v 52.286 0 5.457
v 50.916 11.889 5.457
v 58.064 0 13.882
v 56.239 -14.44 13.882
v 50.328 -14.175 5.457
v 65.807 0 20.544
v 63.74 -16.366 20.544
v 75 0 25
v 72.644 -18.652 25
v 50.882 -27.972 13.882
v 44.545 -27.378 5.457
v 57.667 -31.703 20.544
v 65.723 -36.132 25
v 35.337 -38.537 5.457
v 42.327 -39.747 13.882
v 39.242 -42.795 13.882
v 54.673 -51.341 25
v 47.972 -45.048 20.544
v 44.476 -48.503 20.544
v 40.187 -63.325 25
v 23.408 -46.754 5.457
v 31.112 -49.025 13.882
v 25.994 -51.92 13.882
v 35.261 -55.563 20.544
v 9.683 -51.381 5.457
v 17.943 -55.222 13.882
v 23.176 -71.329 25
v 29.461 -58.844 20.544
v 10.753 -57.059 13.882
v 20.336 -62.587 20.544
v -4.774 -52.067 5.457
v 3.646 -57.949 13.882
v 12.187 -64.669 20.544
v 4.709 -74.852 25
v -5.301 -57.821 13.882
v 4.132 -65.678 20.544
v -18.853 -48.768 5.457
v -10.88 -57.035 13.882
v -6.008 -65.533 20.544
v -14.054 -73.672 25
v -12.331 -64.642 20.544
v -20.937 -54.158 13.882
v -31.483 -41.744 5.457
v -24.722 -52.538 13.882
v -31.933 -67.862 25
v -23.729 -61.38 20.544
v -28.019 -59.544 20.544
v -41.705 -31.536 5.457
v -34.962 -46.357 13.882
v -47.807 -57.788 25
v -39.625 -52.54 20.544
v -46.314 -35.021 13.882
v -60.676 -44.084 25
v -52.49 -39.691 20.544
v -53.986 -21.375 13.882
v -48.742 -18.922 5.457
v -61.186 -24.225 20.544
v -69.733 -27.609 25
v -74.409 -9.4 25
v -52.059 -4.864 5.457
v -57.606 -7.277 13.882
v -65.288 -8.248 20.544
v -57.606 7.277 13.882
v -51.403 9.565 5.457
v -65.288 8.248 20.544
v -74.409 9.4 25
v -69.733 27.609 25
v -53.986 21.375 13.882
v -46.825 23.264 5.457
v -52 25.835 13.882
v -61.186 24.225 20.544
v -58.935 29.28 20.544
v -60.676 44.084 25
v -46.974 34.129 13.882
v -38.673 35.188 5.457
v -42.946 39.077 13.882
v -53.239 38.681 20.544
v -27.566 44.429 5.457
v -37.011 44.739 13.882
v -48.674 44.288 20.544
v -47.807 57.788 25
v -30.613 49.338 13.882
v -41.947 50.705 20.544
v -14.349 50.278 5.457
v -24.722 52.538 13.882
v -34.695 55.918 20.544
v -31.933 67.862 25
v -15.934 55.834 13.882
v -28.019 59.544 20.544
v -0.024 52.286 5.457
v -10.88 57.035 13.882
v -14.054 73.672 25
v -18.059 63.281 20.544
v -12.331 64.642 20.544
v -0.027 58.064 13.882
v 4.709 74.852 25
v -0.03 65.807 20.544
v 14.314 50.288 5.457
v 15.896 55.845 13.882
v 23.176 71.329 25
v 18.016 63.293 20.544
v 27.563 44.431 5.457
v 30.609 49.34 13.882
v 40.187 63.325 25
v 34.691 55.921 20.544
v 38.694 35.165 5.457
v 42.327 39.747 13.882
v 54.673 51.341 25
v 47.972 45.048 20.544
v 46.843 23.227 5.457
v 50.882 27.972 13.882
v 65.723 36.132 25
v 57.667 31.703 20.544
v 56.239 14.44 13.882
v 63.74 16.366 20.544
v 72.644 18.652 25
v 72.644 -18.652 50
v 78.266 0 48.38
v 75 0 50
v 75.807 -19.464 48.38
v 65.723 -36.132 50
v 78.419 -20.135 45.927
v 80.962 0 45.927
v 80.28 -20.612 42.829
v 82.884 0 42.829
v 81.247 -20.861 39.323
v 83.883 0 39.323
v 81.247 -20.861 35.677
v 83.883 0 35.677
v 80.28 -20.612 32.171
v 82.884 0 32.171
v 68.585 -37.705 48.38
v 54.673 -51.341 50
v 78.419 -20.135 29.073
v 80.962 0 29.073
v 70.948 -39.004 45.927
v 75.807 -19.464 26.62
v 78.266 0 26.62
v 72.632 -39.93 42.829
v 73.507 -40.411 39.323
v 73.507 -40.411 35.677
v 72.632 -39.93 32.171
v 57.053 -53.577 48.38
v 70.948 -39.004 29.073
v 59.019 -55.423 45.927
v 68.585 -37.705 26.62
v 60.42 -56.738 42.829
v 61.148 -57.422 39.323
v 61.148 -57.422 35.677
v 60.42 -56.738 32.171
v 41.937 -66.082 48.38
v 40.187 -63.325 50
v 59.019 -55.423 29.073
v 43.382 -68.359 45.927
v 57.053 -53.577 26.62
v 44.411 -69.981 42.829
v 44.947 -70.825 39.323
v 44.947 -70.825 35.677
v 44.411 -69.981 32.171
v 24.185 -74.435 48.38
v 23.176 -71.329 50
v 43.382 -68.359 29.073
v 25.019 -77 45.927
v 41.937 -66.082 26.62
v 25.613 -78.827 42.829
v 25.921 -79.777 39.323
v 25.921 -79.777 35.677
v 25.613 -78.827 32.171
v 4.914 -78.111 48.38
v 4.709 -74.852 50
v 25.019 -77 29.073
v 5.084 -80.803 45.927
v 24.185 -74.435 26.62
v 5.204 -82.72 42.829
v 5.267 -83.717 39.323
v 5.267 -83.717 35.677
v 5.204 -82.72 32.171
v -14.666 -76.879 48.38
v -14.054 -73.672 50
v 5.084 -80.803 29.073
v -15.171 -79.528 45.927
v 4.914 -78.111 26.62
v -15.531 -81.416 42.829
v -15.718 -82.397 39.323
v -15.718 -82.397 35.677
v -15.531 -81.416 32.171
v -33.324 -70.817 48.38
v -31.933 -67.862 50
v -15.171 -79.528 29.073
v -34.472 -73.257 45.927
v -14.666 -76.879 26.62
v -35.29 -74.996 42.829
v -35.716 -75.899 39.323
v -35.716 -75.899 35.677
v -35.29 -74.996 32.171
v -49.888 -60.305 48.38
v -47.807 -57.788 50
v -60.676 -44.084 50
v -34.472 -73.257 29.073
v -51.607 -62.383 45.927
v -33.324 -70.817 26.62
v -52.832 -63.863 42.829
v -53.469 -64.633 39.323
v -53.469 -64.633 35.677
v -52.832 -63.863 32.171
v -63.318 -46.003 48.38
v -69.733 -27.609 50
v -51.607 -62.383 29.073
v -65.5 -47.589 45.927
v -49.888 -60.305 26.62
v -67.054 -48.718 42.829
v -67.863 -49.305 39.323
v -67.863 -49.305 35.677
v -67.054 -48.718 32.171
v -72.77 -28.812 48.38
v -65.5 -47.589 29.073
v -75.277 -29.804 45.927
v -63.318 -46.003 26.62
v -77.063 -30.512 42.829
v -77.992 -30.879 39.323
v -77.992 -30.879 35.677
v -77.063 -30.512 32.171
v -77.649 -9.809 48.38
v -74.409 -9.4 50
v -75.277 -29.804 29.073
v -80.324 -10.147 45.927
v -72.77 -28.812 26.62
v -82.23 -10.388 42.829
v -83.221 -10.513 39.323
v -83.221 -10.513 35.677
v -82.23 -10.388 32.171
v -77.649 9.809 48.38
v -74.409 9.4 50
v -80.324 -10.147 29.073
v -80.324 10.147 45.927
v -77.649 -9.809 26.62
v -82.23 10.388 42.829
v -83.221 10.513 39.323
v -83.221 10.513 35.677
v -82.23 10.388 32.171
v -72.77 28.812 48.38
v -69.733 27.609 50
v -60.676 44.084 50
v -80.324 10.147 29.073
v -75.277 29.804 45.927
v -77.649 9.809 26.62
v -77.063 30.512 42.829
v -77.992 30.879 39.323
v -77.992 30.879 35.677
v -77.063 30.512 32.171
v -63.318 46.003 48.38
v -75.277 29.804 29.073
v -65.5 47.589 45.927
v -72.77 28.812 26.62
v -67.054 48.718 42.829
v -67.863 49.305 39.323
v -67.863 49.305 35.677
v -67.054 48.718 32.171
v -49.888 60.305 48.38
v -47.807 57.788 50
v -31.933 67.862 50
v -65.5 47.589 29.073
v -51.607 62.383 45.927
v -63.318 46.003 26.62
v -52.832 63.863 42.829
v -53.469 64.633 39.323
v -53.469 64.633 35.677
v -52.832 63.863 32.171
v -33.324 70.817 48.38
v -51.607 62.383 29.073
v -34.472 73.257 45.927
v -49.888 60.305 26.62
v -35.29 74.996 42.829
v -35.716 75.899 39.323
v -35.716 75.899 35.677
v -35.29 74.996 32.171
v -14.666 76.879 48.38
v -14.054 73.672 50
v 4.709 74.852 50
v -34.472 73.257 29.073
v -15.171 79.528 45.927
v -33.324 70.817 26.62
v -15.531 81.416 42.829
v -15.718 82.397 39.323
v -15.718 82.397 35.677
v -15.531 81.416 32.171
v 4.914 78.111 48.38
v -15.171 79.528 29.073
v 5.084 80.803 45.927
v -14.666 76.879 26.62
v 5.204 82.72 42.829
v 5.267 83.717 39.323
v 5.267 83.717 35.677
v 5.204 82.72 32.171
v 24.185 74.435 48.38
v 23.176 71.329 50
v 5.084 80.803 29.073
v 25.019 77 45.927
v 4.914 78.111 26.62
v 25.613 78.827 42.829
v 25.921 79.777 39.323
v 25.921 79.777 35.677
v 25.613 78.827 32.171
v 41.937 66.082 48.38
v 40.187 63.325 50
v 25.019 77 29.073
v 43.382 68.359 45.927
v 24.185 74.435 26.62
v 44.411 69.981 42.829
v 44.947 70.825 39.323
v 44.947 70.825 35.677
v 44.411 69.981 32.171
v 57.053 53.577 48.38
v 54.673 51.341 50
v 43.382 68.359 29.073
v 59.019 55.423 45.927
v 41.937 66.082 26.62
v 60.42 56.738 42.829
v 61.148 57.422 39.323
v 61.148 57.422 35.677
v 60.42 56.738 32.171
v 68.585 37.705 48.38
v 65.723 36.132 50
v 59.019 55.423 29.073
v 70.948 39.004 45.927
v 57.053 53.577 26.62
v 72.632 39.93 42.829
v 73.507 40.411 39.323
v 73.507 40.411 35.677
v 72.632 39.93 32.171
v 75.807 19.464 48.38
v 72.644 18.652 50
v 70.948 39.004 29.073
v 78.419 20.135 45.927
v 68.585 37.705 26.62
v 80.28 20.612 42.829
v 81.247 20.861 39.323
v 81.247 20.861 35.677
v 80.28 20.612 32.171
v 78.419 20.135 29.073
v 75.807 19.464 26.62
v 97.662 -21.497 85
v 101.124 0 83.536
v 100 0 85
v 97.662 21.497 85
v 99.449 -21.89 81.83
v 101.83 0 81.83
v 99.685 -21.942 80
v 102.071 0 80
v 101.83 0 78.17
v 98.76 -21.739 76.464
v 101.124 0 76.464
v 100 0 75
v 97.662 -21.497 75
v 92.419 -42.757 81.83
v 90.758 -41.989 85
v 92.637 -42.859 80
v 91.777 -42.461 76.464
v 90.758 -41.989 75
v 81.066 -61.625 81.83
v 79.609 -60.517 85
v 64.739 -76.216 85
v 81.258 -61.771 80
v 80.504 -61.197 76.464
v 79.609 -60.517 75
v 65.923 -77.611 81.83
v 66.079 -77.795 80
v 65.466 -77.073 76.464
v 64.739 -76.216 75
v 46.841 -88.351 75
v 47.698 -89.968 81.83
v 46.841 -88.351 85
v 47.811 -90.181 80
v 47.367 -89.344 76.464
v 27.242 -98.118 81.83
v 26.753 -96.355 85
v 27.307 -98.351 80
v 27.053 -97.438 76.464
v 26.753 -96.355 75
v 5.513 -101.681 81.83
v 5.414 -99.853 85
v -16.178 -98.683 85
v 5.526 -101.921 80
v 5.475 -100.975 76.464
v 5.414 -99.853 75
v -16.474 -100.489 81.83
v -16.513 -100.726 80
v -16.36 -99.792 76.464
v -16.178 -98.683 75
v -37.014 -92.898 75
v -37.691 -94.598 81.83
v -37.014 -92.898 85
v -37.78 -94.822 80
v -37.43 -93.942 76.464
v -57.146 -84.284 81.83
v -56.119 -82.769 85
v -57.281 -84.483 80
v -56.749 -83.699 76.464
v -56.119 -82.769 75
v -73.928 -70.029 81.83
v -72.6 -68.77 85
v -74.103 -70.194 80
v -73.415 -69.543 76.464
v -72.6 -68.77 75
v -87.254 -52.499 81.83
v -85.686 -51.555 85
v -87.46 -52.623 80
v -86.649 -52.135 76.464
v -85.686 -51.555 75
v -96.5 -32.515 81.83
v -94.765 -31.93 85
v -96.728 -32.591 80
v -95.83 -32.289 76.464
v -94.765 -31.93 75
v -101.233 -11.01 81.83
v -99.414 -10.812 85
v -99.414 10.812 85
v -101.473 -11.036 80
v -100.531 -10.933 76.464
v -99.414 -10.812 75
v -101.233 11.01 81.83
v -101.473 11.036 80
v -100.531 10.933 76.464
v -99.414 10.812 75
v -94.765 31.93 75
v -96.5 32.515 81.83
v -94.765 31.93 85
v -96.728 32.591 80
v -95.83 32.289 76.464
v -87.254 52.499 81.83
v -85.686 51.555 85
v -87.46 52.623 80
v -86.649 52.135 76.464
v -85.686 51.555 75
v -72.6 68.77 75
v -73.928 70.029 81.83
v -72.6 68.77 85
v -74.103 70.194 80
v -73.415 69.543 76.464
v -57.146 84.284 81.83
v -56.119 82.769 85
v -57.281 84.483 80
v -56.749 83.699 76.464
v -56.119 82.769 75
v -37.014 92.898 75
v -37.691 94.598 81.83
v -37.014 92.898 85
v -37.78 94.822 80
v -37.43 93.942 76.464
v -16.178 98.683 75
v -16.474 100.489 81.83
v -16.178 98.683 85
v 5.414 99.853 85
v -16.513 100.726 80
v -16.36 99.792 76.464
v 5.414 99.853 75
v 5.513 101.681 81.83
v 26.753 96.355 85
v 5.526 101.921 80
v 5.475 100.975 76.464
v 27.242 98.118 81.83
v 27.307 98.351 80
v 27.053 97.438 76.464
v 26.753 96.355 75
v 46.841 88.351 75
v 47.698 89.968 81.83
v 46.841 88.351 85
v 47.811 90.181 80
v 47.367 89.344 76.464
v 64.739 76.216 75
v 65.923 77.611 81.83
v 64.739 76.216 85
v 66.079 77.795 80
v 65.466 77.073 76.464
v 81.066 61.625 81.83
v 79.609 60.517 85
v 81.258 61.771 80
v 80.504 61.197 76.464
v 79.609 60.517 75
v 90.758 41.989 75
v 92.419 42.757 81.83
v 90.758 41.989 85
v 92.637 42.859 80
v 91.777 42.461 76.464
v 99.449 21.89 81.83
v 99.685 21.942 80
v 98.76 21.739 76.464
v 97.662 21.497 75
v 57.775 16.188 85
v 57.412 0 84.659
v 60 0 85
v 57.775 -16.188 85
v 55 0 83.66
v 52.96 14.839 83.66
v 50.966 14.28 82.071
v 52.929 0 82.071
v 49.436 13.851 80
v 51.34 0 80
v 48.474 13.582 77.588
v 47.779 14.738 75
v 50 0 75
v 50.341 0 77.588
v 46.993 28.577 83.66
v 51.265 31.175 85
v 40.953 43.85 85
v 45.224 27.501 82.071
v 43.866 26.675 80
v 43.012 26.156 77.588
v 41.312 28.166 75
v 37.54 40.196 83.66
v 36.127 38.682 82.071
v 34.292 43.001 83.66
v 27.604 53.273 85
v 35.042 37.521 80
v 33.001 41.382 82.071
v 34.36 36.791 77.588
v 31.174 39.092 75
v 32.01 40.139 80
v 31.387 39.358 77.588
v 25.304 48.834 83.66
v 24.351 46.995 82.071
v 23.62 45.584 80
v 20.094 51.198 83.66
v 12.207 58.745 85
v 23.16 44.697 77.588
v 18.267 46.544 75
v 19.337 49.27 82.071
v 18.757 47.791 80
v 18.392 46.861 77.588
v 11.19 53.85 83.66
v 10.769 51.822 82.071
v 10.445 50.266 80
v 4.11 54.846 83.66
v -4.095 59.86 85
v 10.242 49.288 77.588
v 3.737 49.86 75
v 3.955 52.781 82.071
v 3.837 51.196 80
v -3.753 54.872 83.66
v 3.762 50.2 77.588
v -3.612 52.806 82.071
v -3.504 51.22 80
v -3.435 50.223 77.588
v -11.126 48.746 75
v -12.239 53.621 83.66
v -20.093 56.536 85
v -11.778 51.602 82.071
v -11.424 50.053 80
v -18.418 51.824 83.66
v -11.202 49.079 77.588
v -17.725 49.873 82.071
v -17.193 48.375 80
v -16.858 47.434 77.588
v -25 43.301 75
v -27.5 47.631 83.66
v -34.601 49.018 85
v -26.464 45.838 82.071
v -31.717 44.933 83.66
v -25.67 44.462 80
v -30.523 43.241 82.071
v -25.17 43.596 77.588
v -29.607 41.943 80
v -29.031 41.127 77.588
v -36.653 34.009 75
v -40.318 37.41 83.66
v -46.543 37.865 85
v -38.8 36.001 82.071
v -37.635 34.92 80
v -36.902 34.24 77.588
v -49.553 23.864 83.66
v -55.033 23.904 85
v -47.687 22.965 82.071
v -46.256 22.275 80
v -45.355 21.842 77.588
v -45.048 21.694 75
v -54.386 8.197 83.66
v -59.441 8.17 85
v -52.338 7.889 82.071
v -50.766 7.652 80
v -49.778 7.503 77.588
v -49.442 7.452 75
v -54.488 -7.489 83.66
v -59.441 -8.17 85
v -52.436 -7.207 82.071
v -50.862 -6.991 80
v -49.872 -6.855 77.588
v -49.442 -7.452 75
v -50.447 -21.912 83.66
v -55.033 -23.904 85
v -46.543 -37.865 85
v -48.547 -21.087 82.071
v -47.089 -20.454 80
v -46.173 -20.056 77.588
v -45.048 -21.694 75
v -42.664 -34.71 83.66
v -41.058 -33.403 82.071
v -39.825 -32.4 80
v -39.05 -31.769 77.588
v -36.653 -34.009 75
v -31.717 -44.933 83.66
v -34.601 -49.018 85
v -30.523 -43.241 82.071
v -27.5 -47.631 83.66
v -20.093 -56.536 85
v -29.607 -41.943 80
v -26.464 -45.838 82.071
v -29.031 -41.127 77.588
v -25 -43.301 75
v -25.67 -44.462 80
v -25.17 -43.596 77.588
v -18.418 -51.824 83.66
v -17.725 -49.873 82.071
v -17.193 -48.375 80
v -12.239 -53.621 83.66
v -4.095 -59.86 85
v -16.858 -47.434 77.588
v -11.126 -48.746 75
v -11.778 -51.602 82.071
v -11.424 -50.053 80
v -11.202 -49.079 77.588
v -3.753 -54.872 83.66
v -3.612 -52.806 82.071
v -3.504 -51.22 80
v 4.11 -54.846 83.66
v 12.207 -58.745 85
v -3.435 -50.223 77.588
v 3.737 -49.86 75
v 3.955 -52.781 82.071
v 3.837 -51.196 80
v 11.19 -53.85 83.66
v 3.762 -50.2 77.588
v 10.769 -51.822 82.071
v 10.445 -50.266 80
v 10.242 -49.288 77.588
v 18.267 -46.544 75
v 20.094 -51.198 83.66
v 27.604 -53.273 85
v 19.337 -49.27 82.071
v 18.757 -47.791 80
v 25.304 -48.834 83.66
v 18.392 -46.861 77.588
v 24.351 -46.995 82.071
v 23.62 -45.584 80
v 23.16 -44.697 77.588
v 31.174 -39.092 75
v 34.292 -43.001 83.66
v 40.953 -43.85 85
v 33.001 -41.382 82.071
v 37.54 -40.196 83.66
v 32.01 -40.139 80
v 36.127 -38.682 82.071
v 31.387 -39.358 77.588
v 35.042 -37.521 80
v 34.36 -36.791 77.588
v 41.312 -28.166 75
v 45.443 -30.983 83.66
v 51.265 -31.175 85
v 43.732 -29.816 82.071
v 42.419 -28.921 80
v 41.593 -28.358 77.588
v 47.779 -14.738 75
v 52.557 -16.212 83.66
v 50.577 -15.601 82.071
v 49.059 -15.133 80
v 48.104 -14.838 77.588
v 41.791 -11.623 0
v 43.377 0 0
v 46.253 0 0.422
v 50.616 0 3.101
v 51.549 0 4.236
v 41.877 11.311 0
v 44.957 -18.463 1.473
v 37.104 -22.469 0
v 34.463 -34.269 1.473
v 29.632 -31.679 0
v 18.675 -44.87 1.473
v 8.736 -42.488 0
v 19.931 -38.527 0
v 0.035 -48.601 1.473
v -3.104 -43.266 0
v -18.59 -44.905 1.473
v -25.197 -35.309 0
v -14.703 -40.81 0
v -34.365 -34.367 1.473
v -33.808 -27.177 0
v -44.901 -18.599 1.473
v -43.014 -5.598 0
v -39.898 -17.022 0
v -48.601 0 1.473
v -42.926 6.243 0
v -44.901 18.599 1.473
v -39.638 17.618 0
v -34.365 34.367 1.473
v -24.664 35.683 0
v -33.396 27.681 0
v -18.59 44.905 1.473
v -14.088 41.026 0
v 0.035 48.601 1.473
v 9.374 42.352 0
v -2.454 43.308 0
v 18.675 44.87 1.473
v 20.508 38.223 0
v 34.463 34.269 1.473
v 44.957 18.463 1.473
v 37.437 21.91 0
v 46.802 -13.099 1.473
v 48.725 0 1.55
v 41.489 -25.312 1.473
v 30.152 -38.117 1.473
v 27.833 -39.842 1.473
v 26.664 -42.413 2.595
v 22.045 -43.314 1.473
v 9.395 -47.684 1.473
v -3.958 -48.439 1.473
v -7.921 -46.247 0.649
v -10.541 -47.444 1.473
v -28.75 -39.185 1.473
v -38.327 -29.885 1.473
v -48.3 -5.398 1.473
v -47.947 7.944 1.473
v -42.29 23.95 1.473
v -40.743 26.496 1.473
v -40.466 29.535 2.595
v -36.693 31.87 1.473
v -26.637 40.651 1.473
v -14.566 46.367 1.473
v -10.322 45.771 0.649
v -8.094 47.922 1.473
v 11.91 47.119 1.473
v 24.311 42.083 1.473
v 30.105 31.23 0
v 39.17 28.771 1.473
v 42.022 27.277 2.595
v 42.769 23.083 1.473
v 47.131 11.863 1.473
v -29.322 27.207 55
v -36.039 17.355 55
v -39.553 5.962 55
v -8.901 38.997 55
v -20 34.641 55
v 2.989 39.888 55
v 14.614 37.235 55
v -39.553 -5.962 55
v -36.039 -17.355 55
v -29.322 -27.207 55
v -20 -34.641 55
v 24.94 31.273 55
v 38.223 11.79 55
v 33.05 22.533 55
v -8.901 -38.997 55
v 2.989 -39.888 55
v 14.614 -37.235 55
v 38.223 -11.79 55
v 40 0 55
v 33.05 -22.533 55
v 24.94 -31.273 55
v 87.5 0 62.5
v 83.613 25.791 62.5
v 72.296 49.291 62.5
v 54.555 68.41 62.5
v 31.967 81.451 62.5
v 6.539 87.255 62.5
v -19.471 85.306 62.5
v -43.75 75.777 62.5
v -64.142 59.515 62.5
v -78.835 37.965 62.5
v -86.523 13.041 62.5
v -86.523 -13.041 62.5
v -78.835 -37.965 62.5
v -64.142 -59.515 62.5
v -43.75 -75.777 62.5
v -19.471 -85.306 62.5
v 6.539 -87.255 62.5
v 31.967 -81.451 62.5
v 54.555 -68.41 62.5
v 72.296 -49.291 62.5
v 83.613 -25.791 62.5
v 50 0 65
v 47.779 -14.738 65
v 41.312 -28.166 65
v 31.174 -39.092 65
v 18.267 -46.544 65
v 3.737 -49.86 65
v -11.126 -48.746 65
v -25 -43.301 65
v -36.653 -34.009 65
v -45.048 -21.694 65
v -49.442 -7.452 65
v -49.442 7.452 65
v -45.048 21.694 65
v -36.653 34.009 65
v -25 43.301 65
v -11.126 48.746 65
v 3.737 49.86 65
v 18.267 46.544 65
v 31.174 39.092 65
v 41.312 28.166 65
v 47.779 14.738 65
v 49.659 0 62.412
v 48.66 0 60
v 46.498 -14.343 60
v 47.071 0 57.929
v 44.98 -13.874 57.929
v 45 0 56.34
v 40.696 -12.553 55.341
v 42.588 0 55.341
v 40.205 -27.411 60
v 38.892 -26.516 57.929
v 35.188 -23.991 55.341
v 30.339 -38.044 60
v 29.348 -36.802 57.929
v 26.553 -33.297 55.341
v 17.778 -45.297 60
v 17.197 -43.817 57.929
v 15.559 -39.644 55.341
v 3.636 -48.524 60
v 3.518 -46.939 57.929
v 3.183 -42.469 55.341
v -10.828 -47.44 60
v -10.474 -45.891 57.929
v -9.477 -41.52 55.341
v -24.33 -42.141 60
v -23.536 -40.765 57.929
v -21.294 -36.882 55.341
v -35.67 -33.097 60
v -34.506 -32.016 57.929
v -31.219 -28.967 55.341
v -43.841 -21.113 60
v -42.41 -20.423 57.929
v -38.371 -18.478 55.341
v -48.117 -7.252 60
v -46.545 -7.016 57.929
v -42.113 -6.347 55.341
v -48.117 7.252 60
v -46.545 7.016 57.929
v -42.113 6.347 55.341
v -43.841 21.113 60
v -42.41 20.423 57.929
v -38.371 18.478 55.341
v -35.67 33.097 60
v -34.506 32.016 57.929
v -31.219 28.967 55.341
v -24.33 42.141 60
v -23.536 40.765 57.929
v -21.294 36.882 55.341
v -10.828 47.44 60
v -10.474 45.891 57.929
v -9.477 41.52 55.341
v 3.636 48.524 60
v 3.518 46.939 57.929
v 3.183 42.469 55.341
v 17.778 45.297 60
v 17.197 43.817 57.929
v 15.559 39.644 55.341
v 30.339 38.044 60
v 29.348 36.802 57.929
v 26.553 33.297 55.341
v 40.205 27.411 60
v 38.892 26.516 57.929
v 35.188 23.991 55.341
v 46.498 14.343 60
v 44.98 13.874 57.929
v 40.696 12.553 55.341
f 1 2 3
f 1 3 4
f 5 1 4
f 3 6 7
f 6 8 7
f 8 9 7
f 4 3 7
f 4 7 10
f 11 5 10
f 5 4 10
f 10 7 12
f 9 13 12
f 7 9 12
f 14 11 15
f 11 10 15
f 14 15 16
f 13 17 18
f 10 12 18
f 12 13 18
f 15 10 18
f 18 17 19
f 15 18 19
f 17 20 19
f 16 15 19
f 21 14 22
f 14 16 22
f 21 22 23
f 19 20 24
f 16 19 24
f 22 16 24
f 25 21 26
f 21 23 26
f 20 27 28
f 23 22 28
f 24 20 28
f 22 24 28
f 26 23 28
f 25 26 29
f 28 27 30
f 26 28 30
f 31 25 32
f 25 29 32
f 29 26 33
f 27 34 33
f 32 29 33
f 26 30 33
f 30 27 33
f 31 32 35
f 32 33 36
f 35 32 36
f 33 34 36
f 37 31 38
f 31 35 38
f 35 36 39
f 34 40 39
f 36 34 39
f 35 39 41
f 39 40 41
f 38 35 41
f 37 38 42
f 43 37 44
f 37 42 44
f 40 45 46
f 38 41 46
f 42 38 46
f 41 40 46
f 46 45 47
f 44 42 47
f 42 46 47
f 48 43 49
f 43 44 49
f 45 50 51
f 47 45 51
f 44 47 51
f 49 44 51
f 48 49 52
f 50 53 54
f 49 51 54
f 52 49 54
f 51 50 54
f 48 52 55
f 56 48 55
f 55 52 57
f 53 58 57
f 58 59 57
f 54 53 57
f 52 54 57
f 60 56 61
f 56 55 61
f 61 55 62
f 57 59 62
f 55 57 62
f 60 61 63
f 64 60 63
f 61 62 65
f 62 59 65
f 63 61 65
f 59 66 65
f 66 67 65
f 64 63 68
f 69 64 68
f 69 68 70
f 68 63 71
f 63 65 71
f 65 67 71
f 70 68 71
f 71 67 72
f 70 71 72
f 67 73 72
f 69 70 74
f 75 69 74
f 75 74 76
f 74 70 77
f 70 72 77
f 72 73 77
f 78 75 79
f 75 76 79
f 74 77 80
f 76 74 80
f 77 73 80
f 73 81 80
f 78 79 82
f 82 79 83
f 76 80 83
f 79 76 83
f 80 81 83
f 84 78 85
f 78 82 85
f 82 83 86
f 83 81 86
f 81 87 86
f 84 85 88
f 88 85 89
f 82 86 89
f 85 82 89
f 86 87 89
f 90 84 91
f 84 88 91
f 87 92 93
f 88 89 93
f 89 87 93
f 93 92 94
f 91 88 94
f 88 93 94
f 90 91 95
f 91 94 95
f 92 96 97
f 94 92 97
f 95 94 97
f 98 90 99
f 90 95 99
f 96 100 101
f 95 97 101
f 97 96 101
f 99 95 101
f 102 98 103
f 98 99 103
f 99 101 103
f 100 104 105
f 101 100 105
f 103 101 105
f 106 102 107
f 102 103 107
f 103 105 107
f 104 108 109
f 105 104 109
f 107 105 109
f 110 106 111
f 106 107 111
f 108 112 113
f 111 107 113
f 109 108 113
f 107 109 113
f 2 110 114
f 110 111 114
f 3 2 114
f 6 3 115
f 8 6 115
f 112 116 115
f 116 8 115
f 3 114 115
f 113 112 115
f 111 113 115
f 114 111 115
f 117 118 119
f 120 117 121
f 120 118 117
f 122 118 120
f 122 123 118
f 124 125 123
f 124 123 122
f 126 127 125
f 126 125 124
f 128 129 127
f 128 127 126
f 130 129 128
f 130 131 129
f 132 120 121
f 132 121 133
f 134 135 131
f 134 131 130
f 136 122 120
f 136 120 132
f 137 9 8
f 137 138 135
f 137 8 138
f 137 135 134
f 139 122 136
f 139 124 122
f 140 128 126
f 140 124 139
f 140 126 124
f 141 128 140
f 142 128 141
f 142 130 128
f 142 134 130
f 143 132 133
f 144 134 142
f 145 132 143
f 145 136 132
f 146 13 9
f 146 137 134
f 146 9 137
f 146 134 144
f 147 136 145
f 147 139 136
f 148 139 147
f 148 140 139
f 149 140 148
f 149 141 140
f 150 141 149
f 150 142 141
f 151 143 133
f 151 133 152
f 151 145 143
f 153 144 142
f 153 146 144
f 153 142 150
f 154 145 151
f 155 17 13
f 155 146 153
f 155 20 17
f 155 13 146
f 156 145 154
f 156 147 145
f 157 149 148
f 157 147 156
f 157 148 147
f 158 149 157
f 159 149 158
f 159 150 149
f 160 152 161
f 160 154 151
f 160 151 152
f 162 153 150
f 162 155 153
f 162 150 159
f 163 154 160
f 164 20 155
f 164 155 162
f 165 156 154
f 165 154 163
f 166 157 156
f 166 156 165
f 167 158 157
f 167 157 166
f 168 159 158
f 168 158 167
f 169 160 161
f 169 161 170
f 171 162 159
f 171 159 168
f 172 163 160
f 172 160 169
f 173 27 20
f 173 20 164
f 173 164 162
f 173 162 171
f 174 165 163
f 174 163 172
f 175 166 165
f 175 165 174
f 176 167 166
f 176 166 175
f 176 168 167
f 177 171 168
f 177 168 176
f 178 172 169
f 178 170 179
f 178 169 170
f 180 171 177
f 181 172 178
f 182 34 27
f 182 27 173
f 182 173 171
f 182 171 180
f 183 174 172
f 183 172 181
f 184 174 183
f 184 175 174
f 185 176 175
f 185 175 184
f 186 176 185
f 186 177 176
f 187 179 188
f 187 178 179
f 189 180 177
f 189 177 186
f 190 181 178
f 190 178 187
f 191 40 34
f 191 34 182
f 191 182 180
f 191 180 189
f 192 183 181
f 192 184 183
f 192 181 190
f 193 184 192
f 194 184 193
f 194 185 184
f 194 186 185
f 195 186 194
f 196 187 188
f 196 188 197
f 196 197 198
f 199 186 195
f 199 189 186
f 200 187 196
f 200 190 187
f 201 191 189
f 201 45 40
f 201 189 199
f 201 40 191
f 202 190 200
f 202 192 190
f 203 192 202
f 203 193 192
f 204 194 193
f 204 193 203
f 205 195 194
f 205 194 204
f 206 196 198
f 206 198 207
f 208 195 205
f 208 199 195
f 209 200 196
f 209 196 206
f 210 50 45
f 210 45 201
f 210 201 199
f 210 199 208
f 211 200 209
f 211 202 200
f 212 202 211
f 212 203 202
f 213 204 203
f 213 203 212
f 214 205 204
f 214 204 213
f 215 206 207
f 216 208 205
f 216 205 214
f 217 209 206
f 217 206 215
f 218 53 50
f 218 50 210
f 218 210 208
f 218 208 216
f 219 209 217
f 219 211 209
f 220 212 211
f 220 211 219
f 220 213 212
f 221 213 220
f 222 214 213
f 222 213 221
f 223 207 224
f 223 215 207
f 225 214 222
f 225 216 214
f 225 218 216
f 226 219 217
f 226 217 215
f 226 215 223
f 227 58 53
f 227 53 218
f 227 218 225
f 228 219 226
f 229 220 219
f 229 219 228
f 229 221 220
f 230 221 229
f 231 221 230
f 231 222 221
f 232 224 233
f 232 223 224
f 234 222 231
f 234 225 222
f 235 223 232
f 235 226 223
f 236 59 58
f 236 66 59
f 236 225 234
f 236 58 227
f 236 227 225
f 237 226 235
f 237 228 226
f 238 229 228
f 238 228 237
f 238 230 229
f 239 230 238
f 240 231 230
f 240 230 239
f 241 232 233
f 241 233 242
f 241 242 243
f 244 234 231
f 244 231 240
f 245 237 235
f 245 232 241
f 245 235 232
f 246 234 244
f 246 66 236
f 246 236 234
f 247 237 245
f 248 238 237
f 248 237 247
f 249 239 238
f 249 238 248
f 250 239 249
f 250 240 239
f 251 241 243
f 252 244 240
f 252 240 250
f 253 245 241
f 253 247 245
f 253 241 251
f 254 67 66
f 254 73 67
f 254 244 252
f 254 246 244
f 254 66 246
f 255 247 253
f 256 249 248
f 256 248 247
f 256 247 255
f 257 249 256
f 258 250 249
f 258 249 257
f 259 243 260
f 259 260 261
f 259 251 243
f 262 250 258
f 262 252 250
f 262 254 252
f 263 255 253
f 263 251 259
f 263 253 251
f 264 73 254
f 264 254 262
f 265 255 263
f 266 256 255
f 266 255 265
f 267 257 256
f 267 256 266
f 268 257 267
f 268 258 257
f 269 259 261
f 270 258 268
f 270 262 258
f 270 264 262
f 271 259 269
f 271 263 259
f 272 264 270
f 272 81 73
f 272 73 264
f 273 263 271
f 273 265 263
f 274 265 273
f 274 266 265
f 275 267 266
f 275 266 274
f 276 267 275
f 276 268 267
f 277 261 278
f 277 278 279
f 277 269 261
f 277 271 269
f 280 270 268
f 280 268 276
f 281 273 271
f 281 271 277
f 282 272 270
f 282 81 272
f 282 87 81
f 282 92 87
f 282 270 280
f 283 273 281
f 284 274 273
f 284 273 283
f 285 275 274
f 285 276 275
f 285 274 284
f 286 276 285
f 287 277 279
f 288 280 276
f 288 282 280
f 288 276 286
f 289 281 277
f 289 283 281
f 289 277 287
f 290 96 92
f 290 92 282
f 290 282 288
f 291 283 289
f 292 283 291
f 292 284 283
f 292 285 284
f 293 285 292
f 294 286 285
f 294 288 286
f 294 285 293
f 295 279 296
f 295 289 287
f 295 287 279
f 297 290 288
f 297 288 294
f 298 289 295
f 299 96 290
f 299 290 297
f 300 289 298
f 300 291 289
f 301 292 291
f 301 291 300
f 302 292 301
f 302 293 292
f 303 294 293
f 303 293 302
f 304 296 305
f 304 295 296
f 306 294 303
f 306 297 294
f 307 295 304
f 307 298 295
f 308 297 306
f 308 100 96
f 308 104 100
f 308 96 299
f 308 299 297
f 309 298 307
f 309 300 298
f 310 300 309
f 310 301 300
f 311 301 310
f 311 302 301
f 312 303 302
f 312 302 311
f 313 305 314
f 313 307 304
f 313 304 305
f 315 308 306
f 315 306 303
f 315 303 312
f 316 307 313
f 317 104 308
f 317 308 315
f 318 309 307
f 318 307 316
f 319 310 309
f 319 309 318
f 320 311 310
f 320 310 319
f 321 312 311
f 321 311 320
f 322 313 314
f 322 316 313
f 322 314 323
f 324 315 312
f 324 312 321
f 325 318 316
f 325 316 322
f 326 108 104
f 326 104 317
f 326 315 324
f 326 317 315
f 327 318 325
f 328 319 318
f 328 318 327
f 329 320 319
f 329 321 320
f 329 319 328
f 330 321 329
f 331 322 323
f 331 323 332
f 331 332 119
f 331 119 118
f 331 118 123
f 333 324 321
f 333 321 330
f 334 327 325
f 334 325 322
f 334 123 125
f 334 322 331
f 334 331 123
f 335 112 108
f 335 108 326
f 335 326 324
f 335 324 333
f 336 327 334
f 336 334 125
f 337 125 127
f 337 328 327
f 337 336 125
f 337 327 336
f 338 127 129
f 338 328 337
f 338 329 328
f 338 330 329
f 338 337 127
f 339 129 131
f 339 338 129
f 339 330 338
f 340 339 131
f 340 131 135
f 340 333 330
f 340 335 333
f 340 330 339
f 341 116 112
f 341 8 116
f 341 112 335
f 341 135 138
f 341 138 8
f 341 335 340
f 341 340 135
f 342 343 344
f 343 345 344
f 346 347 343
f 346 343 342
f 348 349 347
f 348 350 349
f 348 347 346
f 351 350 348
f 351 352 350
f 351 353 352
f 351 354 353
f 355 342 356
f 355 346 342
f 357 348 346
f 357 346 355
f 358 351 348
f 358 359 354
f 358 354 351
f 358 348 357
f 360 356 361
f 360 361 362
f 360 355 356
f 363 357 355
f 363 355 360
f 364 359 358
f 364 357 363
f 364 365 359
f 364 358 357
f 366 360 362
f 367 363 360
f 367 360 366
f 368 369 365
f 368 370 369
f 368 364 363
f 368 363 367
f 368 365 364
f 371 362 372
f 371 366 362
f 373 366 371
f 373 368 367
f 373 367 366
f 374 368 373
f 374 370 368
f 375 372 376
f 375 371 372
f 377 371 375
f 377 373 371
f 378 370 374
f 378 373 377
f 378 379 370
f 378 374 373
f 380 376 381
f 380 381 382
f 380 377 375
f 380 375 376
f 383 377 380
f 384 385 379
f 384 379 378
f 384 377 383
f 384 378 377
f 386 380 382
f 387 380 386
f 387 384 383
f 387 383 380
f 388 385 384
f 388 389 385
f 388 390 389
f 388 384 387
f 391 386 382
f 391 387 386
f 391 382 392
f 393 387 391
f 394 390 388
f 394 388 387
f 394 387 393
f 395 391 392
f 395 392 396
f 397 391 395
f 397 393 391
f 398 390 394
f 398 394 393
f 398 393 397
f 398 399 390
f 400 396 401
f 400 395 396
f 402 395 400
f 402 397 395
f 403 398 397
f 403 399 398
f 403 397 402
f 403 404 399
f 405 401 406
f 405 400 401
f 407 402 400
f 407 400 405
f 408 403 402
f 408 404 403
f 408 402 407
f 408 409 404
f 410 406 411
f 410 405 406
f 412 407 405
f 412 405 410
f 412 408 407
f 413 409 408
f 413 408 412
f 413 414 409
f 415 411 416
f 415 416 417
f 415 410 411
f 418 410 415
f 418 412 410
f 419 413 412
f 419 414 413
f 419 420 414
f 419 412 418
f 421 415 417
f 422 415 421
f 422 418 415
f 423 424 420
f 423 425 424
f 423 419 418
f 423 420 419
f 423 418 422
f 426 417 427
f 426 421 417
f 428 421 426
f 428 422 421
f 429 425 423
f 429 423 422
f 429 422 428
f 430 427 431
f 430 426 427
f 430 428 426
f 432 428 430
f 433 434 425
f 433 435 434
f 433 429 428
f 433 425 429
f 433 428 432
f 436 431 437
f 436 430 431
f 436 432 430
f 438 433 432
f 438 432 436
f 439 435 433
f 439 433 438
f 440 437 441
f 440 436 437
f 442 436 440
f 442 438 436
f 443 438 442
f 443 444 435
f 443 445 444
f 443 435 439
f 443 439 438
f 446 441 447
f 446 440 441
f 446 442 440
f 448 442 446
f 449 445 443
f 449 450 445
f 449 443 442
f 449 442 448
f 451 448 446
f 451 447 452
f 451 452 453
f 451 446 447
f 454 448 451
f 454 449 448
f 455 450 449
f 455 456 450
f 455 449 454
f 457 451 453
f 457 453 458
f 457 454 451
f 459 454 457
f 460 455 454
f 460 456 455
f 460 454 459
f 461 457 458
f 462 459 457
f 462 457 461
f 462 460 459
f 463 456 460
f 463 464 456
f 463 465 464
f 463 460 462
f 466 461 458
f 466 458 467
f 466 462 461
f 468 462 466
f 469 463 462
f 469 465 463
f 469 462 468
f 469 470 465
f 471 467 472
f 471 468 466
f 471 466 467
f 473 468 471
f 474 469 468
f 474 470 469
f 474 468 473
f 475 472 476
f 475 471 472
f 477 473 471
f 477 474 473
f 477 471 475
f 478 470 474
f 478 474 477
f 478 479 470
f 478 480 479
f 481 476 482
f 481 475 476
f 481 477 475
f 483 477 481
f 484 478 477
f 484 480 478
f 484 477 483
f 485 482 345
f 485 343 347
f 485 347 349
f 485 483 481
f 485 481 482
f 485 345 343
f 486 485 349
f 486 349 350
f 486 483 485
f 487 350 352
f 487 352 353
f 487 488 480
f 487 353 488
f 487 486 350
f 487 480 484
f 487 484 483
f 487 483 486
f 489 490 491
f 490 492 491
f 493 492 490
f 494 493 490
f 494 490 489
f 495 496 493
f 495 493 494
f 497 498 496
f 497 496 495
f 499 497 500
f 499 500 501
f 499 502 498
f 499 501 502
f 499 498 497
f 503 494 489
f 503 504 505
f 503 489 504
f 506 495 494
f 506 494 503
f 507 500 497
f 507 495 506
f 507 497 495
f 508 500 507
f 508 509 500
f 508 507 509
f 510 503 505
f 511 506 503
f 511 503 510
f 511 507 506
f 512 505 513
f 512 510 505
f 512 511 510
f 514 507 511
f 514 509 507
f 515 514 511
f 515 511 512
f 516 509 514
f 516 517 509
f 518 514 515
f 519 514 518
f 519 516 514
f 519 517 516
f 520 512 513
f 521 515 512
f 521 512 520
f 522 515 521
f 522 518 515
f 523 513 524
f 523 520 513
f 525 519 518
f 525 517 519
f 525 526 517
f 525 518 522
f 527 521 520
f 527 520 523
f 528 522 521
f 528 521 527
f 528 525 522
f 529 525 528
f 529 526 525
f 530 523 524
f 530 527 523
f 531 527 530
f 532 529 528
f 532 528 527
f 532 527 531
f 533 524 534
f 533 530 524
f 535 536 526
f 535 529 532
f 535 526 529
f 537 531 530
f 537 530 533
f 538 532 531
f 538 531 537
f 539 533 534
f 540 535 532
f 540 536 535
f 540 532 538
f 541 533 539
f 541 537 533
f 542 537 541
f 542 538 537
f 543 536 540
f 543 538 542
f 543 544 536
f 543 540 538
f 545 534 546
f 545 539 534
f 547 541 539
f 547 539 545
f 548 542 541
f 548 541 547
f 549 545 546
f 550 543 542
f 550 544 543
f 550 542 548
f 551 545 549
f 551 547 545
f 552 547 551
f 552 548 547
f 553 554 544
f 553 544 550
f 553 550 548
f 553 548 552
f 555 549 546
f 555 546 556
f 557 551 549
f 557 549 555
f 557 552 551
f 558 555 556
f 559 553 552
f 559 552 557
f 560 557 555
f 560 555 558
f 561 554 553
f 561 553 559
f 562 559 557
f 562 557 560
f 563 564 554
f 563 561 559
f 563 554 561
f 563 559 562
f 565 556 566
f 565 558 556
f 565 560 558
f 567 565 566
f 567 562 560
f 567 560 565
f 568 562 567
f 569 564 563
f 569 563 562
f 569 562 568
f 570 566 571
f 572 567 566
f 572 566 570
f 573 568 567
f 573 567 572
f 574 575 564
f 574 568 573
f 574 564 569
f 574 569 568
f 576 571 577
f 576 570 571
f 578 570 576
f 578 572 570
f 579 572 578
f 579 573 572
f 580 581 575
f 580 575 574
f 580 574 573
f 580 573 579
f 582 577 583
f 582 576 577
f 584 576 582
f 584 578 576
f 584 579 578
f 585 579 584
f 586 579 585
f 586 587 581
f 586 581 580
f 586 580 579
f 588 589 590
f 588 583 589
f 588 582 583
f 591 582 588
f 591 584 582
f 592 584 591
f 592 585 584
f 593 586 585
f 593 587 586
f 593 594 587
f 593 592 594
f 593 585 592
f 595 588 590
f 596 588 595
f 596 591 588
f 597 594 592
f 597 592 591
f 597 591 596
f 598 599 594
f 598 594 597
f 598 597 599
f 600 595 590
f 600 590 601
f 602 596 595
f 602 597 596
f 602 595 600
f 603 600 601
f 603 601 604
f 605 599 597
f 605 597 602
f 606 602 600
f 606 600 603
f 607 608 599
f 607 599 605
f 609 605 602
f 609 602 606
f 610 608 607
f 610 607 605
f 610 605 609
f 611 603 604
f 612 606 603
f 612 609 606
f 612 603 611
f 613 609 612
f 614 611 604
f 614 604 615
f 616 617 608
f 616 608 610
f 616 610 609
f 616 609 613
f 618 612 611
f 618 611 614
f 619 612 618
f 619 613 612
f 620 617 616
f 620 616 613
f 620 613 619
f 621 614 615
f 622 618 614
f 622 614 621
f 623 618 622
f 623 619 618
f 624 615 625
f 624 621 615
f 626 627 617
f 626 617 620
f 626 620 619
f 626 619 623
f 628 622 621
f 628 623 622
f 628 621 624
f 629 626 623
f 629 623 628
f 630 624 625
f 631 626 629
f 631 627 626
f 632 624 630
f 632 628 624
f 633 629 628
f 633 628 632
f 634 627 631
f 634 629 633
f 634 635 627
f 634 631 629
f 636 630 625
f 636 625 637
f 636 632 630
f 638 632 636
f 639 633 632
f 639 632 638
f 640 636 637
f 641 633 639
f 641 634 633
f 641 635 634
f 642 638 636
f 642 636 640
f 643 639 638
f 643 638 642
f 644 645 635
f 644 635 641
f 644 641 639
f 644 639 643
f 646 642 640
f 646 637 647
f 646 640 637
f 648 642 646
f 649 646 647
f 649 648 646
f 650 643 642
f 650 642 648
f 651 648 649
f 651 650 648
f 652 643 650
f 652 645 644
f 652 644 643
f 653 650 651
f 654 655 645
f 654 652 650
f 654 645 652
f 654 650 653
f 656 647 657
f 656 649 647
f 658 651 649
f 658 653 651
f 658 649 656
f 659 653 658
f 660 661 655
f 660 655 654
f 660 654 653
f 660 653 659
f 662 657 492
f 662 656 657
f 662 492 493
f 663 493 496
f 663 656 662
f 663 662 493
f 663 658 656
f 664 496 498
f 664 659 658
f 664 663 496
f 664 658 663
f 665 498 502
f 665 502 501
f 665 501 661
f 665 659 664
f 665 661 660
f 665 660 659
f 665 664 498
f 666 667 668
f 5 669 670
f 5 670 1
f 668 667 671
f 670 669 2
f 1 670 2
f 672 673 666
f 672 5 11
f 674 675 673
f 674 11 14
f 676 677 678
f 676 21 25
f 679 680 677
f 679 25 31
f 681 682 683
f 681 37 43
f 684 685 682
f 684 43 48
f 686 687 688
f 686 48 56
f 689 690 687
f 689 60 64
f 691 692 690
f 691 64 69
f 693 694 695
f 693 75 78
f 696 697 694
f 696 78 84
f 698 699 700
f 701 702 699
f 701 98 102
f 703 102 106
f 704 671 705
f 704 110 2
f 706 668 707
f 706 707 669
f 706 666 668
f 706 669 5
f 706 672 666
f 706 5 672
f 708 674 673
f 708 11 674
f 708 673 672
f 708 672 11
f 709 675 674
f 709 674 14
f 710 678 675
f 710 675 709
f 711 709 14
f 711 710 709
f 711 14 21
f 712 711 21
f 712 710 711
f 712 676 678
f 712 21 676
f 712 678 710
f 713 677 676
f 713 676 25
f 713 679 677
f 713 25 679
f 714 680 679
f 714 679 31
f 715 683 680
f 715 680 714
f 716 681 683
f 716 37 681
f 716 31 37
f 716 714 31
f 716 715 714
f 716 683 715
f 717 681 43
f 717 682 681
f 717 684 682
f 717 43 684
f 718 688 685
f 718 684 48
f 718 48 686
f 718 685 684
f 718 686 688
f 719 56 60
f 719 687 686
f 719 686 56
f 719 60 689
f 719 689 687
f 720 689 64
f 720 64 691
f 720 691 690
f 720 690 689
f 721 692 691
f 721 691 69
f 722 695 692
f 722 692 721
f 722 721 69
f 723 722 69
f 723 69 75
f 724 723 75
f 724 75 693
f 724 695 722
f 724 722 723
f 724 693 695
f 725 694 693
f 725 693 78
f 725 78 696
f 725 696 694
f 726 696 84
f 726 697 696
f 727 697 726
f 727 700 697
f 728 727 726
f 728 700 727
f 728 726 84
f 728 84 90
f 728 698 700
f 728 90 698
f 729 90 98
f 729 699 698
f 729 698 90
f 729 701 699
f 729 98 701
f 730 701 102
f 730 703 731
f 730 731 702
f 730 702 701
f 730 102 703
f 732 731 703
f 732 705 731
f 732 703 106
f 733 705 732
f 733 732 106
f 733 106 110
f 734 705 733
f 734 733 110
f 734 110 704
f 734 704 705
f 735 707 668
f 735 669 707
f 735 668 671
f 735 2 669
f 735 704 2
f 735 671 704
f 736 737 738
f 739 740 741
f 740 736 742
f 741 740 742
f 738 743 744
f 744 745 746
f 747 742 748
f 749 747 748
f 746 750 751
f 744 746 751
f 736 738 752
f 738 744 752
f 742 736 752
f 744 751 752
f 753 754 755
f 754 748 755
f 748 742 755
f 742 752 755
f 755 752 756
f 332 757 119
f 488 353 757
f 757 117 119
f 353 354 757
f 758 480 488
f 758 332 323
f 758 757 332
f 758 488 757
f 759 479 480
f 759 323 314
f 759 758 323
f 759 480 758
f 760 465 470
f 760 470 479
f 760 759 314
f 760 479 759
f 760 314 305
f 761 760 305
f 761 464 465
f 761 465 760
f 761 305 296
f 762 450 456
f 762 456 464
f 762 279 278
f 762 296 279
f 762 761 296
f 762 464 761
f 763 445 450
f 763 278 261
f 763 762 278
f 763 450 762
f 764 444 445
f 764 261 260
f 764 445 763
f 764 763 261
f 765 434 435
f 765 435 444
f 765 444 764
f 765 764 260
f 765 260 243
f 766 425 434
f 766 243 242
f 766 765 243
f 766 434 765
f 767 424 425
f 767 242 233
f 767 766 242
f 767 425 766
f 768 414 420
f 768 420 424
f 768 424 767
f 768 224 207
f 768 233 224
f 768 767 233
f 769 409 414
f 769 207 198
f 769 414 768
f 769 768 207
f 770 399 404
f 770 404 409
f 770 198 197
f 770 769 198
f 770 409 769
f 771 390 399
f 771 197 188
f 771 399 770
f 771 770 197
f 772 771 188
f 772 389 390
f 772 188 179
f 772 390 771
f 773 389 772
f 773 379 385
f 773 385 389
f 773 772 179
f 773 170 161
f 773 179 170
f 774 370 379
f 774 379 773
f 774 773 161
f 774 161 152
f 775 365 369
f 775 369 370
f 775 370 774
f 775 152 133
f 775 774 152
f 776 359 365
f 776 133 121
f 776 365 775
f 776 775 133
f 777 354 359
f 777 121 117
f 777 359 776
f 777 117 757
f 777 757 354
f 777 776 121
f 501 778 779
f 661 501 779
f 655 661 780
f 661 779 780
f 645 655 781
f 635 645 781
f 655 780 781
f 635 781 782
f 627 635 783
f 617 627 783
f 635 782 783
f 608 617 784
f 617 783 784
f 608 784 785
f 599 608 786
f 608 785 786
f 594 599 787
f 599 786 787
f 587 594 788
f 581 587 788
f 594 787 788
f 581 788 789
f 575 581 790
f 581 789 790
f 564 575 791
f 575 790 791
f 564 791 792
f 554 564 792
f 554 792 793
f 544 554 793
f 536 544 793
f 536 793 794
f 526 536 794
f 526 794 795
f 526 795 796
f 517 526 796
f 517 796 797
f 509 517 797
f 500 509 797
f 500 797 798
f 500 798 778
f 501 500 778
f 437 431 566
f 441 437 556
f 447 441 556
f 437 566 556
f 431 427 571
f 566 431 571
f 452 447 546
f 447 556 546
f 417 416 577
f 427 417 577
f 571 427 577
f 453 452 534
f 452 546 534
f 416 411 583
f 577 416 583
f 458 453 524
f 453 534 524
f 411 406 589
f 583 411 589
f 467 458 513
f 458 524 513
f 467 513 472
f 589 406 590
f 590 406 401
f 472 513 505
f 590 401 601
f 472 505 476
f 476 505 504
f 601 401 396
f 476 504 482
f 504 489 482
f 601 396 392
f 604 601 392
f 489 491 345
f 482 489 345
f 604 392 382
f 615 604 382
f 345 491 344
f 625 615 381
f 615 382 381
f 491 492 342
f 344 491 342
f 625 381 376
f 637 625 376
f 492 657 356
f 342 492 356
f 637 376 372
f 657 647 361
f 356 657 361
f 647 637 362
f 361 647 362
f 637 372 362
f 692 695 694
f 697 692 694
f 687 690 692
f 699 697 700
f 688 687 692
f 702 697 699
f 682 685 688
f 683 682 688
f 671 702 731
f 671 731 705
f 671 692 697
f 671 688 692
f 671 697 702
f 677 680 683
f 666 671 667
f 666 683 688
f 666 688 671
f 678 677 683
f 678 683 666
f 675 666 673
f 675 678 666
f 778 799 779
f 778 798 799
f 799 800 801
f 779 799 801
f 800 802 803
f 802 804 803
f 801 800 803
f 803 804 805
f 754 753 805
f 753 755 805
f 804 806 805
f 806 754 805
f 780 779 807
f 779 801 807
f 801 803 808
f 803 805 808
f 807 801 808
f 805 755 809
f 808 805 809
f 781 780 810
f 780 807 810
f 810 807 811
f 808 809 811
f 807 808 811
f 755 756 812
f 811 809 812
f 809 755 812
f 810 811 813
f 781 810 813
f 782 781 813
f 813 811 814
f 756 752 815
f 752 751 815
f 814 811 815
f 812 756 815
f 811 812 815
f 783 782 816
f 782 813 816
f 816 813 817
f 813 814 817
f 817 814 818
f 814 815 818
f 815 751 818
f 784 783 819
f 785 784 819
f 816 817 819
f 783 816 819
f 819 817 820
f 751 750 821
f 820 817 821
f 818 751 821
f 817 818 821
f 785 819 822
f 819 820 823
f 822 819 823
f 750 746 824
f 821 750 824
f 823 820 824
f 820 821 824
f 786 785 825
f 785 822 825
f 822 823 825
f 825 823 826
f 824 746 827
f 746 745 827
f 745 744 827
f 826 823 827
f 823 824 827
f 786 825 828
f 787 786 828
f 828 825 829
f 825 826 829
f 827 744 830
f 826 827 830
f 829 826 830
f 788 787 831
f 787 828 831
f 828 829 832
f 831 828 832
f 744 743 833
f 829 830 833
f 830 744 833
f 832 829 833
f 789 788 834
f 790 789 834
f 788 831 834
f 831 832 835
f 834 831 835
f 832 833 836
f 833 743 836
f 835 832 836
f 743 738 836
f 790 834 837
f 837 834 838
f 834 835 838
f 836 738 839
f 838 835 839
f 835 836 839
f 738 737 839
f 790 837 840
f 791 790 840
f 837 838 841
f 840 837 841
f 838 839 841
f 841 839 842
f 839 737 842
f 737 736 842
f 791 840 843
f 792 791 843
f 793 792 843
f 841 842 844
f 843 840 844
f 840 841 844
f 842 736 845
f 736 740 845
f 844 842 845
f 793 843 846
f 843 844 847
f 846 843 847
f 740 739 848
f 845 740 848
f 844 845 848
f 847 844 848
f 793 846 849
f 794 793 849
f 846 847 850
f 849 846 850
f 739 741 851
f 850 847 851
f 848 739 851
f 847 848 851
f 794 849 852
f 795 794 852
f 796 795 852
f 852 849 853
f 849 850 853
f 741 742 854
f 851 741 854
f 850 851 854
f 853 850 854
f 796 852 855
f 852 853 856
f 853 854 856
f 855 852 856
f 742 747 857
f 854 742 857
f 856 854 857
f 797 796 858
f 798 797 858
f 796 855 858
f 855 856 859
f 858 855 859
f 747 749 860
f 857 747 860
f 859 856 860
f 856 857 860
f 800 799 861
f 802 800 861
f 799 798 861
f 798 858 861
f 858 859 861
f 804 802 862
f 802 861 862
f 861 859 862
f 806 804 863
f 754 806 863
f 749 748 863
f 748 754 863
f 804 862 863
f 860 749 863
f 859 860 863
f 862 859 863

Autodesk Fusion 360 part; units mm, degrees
sketch "Boceto1" plane through (0, 0, 0) normal (0, 1, 0) x (1, 0, 0)
  arc A0 (75, -50) -> (75, -25) centre (70.8333, -37.5) ccw
  line L0 (75, -50) -> (100, -75)
  arc A1 (100, -85) -> (100, -75) centre (95, -80) ccw
  line L1 (100, -85) -> (50, -85)
  line L2 (50, -85) -> (50, -55)
  line L3 (50, -55) -> (0, -55)
  line L4 (0, -55) -> (0, 0)
  line L5 (-25, 0) -> (-25, -10)
  arc A2 (50, 0) -> (75, -25) centre (87.5, 12.5) ccw
  line L6 (50, 0) -> (0, 0)
revolve "Revolución1" add sketch "Boceto1" angle 360 about axis through (0, 0, 55) along (0, 0, -1) makes body 1
fillet "Empalme1" radius 10 1 edges at (-46.6164, -18.0808, 0) on bodies 1
fillet "Empalme2" radius 10 1 edges at (-46.6164, -18.0808, 85) on bodies 1
fillet "Empalme3" radius 10 1 edges at (-46.6164, -18.0808, 55) on bodies 1
sketch "Boceto7" plane through (0, 0, 0) normal (0, 0, 1) x (1, 0, 0)
  line L0 (150, -130) -> (-150, -130)
  line L1 (-150, -130) -> (-150, 130)
  line L2 (-150, 130) -> (150, 130)
  line L3 (150, 130) -> (150, -130)
  line L4 (150, -130) -> (-150, 130) construction
  line L5 (-150, -130) -> (150, 130) construction
extrude "Extruir1" add sketch "Boceto7" along normal blind 160 separate body makes body 2
combine "Combinar1" operation cut target body 2 tool bodies 1 keep tools
hidden bodies 2
